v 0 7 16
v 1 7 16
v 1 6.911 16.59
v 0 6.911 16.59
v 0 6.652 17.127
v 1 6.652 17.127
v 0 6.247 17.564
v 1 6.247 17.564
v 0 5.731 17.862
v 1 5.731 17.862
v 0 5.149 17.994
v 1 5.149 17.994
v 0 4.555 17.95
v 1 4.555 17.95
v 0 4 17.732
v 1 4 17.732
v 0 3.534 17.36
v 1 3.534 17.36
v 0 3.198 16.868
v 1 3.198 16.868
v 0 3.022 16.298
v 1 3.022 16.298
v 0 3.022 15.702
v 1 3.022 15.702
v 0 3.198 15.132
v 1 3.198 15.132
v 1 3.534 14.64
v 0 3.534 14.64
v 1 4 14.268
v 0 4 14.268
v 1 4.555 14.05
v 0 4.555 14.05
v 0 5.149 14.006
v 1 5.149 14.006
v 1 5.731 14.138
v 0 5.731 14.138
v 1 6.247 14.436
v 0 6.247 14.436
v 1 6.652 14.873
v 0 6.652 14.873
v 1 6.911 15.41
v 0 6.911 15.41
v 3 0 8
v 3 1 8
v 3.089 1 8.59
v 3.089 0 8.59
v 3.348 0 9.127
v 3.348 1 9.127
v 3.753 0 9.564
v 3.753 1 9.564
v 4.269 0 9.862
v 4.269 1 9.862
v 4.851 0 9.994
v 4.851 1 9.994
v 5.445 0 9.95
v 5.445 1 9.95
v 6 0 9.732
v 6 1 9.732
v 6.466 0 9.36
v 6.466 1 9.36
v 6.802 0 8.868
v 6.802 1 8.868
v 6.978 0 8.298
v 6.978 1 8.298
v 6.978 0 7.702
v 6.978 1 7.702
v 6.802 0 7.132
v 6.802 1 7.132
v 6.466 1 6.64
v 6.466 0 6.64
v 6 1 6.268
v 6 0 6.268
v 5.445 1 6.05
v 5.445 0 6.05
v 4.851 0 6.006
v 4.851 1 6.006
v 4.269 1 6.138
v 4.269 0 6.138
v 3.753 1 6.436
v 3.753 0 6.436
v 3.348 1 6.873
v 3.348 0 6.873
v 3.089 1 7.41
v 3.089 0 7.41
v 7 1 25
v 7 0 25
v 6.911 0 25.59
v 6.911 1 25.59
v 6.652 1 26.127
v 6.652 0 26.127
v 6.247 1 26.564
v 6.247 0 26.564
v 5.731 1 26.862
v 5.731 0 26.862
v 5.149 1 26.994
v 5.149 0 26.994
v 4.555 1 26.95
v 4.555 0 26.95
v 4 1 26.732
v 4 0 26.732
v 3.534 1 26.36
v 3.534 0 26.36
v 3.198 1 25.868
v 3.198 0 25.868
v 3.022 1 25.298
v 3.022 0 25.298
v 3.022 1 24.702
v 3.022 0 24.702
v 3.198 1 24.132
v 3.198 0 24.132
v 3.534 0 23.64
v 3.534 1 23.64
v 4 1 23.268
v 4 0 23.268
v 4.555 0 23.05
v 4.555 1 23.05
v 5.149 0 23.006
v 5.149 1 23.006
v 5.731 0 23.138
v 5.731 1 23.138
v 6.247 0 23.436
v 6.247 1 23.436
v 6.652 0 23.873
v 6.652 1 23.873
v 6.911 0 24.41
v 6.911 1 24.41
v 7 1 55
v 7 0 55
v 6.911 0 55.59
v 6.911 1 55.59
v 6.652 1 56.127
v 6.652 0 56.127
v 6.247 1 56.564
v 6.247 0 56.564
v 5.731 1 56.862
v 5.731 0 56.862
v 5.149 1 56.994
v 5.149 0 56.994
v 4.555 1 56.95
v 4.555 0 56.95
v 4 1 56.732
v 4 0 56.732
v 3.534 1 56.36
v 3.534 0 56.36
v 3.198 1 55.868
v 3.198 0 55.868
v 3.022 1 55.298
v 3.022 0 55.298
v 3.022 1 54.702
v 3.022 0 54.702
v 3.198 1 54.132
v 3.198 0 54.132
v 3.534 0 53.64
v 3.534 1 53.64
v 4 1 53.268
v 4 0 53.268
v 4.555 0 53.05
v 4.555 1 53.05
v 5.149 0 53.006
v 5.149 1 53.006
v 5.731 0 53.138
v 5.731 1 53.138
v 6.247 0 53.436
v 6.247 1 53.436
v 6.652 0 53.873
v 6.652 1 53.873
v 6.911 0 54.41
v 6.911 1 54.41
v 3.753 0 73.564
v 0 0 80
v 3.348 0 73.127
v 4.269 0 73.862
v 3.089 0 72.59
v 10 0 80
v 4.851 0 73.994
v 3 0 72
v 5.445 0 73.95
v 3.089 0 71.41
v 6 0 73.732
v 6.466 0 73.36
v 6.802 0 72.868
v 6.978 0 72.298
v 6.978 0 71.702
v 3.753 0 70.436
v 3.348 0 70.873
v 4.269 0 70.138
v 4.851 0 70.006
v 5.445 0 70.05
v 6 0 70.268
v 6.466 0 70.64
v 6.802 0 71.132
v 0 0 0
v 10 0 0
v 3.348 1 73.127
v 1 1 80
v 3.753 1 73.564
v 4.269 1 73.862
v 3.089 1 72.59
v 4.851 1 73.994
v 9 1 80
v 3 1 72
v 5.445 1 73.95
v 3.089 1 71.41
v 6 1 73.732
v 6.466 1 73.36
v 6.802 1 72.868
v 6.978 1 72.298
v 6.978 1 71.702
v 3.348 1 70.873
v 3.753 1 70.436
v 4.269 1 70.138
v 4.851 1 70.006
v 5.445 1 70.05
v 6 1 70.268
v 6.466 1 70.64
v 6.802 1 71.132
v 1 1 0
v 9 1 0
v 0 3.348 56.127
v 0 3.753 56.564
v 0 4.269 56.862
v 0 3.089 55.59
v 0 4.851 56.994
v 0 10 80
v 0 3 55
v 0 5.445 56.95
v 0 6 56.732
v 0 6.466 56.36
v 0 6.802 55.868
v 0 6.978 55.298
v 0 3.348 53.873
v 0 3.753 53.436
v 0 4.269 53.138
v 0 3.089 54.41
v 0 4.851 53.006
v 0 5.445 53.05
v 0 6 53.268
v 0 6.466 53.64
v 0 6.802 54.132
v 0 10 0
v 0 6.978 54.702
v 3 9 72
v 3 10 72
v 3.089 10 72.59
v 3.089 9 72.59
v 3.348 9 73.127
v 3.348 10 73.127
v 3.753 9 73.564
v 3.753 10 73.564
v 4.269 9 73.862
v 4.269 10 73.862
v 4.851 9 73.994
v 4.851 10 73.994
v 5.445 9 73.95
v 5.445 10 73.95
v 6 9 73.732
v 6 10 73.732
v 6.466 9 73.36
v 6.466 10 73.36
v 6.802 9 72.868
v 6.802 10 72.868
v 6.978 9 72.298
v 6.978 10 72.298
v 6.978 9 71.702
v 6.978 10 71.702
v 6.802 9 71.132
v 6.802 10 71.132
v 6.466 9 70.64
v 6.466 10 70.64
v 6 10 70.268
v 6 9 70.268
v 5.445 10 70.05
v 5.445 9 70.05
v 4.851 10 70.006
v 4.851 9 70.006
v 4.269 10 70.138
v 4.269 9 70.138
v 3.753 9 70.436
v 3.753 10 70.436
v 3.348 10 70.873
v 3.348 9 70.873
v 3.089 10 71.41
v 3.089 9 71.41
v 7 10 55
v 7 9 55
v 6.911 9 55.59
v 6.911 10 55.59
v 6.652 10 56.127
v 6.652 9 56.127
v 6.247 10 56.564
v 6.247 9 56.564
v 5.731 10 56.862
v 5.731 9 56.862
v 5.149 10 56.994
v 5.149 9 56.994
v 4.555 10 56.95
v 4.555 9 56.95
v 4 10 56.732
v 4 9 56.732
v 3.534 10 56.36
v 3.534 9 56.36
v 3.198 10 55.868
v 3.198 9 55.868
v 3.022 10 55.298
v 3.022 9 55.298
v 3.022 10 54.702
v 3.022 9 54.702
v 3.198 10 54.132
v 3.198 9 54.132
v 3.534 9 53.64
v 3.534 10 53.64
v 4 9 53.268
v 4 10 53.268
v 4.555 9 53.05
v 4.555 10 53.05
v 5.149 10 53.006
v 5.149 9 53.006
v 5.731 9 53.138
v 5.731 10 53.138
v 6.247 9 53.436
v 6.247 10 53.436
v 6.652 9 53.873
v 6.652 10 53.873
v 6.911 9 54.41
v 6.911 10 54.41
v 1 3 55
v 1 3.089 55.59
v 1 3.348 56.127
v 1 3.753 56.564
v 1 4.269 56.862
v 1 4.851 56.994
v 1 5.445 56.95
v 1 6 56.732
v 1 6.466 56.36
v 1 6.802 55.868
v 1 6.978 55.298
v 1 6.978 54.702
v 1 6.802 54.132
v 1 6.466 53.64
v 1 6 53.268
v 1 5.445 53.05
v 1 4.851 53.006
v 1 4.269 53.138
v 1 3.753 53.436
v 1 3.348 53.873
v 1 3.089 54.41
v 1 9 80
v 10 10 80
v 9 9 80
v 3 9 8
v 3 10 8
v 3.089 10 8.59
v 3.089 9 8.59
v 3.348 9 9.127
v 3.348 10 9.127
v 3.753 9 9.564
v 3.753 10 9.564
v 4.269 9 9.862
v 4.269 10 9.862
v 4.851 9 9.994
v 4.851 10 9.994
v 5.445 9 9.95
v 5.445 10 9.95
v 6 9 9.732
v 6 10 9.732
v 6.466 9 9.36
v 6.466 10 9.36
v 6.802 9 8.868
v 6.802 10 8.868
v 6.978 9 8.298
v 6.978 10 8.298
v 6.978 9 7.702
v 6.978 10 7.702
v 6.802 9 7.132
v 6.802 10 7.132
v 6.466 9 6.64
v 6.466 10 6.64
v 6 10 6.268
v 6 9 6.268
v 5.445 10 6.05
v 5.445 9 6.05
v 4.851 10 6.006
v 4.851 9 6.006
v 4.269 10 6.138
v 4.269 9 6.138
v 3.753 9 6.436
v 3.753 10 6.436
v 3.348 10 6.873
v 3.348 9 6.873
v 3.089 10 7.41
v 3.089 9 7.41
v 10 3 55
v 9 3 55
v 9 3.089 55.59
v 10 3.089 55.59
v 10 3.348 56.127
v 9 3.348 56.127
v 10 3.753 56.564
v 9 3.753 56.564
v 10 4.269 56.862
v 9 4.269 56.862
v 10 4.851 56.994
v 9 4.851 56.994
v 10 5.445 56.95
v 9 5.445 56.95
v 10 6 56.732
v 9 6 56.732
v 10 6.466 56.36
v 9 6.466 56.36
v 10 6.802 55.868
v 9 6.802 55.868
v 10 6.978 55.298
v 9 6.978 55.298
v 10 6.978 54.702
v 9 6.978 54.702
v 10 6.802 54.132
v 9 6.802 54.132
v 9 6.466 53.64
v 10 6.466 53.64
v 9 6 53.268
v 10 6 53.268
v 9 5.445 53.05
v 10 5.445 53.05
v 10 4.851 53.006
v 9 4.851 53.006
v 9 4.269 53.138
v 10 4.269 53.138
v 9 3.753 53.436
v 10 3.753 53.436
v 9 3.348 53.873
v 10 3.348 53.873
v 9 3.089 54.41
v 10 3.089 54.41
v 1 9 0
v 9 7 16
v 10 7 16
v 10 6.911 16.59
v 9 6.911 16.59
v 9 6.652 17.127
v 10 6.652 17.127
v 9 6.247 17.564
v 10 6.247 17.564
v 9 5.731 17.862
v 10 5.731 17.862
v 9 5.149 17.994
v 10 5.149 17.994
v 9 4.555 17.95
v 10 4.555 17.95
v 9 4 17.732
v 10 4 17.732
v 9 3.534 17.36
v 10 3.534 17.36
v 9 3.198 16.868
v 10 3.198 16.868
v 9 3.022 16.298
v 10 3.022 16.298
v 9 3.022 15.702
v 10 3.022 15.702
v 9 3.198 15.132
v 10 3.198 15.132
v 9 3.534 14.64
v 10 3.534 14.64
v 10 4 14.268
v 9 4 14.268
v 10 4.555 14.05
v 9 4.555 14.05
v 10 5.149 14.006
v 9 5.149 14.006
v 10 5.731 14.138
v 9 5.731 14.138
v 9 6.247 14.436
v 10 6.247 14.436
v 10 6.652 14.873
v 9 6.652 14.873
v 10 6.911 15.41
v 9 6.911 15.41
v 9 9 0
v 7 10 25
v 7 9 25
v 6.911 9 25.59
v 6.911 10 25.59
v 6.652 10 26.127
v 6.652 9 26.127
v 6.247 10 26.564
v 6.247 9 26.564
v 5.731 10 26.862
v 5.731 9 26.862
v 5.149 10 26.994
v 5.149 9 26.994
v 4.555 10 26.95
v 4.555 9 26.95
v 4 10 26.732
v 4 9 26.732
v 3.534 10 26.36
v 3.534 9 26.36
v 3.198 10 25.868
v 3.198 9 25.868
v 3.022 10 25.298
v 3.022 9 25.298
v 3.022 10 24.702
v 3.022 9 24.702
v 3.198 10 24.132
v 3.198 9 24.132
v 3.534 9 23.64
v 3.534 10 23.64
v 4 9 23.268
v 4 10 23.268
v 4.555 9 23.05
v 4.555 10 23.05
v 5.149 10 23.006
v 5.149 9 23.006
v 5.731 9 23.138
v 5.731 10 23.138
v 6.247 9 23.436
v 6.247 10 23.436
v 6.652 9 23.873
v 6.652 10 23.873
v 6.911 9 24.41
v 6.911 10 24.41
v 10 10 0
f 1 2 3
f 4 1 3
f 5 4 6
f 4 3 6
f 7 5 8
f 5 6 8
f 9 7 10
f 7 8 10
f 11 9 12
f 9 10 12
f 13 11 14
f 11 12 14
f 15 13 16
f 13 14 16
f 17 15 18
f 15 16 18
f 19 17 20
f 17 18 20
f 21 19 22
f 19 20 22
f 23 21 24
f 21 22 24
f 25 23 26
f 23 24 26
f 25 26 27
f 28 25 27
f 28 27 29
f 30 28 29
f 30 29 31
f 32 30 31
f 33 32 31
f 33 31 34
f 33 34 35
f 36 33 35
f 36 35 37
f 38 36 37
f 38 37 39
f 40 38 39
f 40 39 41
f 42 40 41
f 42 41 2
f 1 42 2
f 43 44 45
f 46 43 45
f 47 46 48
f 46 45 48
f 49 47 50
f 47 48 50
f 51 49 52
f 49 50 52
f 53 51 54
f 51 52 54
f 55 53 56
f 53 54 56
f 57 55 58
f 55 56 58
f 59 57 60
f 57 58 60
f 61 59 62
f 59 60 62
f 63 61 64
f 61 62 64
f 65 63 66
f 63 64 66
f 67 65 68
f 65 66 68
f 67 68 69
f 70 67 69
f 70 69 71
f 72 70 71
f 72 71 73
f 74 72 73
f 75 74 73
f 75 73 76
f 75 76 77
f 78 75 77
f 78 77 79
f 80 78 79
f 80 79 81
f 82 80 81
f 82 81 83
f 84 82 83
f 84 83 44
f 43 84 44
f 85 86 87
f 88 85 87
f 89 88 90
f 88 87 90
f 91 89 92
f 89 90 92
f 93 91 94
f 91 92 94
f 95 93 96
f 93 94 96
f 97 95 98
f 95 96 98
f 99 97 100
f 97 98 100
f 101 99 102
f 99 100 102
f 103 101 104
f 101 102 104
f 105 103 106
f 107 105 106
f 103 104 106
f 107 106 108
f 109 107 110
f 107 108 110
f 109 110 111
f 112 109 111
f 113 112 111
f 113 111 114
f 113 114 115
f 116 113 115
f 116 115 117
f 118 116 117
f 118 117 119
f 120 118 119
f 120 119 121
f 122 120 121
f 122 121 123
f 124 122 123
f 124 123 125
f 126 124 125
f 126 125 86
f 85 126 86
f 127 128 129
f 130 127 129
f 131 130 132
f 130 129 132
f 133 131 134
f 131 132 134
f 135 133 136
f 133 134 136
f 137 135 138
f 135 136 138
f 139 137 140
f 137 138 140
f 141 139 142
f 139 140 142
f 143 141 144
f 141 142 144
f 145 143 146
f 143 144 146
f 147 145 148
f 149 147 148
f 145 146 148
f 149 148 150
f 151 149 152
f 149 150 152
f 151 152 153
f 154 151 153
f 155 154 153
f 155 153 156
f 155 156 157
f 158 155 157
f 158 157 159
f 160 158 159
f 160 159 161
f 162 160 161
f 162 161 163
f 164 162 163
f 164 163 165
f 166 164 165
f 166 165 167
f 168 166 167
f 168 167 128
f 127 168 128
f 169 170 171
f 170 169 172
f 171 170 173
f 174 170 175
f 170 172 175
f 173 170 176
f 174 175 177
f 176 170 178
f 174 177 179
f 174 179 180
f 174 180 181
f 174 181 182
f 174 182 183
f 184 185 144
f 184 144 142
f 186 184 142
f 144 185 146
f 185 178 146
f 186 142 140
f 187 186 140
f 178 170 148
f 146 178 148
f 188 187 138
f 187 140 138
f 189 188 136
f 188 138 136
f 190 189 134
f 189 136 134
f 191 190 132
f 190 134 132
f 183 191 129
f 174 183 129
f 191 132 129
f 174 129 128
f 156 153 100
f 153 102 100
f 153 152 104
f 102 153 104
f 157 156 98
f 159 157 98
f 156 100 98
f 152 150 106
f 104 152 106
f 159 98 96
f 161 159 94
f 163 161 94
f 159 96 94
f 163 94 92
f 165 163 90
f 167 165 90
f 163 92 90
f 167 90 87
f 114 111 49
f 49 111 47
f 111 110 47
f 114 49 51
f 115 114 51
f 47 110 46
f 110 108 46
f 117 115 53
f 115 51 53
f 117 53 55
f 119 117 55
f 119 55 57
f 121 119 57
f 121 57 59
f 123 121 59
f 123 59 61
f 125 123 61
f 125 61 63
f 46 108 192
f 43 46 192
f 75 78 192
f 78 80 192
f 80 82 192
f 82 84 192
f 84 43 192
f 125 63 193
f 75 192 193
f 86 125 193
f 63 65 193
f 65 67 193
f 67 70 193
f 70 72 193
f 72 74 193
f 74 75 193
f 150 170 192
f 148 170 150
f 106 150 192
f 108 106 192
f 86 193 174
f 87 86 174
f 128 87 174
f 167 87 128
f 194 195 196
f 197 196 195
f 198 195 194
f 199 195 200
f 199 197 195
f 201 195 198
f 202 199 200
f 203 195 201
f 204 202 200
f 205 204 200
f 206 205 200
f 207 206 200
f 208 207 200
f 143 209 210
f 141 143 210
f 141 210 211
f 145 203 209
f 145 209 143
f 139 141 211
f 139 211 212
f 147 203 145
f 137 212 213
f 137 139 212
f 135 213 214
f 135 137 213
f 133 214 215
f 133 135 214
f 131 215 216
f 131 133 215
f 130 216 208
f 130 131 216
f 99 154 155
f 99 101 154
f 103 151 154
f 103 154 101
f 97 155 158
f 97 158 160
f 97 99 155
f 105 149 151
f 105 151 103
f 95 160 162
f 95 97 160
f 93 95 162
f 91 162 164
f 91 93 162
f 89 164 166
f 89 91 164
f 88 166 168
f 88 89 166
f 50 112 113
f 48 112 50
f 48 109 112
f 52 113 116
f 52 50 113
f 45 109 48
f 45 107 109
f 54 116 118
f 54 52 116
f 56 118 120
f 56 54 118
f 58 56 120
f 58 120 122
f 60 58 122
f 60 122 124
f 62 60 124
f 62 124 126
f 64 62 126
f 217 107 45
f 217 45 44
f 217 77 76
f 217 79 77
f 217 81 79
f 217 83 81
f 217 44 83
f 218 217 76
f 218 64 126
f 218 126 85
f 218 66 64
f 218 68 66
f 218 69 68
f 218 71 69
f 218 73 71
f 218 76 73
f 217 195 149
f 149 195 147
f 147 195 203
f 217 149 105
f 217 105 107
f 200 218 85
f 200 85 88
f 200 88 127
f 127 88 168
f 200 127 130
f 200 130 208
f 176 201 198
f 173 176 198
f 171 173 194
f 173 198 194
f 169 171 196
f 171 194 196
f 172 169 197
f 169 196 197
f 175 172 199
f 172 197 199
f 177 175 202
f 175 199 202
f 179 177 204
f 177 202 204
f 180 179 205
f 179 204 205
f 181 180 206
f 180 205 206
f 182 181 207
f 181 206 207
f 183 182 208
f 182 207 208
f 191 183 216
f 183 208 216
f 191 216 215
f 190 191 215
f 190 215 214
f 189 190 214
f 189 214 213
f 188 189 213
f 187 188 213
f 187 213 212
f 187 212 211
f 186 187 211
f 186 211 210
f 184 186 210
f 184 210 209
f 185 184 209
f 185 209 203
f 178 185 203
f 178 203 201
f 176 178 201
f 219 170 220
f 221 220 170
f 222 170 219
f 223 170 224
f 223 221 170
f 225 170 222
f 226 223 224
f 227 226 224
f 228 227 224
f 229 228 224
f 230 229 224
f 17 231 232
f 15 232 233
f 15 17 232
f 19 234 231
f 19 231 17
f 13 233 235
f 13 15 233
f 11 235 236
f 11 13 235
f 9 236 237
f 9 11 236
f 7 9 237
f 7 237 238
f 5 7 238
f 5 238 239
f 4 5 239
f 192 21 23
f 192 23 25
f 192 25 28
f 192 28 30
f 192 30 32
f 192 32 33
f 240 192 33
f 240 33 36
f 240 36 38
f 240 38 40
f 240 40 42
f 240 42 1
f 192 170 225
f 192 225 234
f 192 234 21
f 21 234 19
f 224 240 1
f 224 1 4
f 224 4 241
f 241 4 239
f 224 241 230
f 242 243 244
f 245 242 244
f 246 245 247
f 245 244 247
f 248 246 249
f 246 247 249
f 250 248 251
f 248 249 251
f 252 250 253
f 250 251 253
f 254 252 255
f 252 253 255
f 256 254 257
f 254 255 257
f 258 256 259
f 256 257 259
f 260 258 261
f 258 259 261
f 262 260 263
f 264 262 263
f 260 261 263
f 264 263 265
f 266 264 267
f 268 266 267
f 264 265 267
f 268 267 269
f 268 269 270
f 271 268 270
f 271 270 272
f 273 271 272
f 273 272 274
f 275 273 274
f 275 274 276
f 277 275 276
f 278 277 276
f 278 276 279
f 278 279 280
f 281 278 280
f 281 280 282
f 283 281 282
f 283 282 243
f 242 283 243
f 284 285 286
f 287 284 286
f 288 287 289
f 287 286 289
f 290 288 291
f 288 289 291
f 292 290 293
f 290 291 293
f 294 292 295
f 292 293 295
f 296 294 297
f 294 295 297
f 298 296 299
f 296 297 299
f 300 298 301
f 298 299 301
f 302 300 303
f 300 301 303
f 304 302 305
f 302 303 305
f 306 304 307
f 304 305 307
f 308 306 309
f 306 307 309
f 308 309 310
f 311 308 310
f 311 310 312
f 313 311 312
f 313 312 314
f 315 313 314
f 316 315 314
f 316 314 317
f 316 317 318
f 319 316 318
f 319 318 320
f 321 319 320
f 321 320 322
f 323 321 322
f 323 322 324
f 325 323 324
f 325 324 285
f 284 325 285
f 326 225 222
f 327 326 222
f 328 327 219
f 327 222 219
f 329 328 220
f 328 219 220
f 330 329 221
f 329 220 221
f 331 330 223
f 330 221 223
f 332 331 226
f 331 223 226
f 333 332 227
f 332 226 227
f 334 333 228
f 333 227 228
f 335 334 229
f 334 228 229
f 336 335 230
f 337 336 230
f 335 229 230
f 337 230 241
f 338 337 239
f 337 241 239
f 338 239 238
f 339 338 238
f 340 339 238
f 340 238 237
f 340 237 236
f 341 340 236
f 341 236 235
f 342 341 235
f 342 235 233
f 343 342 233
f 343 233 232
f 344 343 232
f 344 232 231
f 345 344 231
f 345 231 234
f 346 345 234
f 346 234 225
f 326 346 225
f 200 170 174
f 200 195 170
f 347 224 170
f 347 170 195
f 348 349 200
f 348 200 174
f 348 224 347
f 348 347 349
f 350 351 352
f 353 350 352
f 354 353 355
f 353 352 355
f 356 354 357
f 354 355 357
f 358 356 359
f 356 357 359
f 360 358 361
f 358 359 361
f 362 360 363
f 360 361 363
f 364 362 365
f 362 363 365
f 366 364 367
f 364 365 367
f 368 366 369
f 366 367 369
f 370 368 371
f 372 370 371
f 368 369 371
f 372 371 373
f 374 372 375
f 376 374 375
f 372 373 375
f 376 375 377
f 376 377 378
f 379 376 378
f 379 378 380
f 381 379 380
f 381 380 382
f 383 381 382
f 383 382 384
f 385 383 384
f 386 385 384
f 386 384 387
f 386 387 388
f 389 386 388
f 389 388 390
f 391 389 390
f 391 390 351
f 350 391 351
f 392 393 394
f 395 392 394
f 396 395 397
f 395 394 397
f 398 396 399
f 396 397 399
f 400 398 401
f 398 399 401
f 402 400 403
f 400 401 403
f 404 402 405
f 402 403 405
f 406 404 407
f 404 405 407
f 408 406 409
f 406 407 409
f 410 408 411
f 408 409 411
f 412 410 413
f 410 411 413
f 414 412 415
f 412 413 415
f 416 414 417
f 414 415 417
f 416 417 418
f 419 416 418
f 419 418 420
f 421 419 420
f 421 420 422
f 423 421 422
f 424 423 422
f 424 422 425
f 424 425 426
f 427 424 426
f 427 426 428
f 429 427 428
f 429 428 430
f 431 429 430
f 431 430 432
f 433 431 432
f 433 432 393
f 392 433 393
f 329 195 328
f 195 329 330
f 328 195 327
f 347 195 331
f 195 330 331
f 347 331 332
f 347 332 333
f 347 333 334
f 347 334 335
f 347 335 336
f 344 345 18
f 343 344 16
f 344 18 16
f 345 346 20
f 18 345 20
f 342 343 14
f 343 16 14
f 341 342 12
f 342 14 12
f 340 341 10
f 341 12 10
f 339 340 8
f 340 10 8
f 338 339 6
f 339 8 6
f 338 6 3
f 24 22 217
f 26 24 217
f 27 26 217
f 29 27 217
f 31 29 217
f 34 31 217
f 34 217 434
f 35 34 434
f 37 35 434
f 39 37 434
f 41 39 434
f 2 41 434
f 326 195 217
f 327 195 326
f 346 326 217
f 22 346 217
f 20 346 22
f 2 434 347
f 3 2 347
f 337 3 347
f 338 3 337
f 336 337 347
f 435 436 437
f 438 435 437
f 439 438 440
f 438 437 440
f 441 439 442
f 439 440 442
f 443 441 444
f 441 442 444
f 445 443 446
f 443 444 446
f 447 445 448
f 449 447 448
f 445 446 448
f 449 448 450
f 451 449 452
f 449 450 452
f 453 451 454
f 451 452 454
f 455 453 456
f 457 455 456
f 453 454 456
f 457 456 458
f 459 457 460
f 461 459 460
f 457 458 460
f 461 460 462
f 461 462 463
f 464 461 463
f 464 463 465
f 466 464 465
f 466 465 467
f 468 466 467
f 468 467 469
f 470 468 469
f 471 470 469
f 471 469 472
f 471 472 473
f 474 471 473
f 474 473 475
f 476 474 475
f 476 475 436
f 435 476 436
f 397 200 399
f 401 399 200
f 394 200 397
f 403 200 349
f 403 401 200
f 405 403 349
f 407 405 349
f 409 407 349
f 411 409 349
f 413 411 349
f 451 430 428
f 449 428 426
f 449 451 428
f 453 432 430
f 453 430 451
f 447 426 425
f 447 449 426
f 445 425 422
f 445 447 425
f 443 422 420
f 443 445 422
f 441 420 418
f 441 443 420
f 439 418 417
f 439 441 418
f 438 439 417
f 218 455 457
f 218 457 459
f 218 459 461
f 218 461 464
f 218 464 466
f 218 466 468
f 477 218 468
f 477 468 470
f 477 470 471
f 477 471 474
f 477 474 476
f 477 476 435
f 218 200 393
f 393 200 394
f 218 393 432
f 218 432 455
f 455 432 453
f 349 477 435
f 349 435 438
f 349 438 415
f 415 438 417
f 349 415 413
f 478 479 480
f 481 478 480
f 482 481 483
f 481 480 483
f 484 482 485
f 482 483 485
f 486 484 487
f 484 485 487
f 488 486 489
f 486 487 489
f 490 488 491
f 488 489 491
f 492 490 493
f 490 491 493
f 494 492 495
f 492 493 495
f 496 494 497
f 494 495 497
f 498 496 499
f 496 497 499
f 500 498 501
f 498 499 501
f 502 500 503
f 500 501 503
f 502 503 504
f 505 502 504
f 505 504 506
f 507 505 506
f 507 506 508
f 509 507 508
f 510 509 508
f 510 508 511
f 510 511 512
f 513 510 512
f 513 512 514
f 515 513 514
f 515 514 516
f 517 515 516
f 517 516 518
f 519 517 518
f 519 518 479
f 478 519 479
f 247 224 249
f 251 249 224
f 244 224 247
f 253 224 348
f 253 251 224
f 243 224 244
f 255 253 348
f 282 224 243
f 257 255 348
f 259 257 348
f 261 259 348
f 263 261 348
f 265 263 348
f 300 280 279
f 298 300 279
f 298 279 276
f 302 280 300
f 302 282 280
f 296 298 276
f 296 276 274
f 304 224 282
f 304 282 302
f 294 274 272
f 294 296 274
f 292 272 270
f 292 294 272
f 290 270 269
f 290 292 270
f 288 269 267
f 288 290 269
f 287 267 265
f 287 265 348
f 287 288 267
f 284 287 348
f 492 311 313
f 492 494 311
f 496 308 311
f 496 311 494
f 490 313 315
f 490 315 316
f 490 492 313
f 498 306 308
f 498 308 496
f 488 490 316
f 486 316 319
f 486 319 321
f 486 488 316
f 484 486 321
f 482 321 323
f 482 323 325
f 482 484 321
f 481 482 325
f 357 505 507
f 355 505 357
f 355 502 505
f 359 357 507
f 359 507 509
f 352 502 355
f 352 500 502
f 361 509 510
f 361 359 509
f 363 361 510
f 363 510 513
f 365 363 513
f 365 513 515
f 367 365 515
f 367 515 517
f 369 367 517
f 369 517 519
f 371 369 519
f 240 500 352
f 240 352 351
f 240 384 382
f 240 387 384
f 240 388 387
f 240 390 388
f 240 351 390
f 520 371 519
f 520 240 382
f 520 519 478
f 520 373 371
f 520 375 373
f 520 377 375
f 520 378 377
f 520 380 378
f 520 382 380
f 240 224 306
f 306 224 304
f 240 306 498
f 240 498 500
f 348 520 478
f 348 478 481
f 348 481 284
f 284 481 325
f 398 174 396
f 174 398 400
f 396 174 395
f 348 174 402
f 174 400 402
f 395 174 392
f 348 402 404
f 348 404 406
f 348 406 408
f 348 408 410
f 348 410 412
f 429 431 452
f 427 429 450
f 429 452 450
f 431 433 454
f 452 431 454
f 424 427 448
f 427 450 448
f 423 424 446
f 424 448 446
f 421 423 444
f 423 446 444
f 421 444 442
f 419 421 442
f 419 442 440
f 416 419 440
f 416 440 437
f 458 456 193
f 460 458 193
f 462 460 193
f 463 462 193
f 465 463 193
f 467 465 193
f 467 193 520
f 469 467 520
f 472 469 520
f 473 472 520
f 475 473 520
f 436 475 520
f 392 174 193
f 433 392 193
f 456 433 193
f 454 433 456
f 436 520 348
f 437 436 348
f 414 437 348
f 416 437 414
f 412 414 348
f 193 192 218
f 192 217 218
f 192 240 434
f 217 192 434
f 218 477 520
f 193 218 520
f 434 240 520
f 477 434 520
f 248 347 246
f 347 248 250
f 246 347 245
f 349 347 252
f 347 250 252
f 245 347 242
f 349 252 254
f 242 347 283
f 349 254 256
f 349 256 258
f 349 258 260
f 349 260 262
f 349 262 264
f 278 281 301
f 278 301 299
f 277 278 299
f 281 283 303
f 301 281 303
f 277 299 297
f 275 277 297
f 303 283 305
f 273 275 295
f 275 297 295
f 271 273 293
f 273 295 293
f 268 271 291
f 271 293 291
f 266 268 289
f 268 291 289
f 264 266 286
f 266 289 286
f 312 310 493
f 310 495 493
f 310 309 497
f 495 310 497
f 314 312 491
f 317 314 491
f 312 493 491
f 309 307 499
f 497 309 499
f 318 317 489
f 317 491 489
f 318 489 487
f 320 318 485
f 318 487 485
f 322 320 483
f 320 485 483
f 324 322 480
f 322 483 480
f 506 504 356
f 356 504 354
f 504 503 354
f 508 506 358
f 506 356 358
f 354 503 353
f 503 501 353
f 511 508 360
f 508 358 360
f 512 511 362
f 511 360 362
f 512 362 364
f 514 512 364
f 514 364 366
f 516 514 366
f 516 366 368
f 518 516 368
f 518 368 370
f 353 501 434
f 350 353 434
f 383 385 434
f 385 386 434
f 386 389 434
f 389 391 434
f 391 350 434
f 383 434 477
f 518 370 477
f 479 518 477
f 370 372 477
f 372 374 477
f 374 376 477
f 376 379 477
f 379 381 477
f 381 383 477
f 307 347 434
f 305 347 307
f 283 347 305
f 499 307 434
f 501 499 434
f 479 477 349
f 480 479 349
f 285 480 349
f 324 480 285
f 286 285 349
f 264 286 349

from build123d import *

# Parameters (mm, degrees)
SKETCH_1_W          = 10
SKETCH_1_H          = 10
SKETCH_1_W_2        = 8
SKETCH_1_H_2        = 8
EXTRUDE_2_DEPTH     = 80
SKETCH_2_R          = 2
CUT_EXTRUDE_1_DEPTH = 70
SKETCH_3_R          = 2
CUT_EXTRUDE_2_DEPTH = 104
SKETCH_4_R          = 2
CUT_EXTRUDE_3_DEPTH = 104
SKETCH_5_R          = 2
CUT_EXTRUDE_4_DEPTH = 100
SKETCH_6_R          = 2
CUT_EXTRUDE_5_DEPTH = 10


with BuildPart() as part:
    # 草图1 → 凸台-拉伸2 (new body)
    with BuildSketch(Plane.XY):
        with Locations((5, 5)):
            Rectangle(SKETCH_1_W, SKETCH_1_H)
        with Locations((5, 5)):
            Rectangle(SKETCH_1_W_2, SKETCH_1_H_2, mode=Mode.SUBTRACT)
    extrude(amount=EXTRUDE_2_DEPTH)

    # 草图2 → 切除-拉伸1 (cut)
    with BuildSketch(Plane(origin=(0, 10, 0), x_dir=(1, 0, 0), z_dir=(0, 1, 0))):
        with Locations(Location((5, -72, 0), (0, 0, 180))):
            Circle(SKETCH_2_R)
        with Locations(Location((5, -8, 0), (0, 0, 180))):
            Circle(SKETCH_2_R)
    extrude(amount=-CUT_EXTRUDE_1_DEPTH, mode=Mode.SUBTRACT)

    # 草图3 → 切除-拉伸2 (cut)
    with BuildSketch(Plane.XZ):
        with Locations((5, 25)):
            Circle(SKETCH_3_R)
    extrude(amount=-CUT_EXTRUDE_2_DEPTH, mode=Mode.SUBTRACT)

    # 草图4 → 切除-拉伸3 (cut)
    with BuildSketch(Plane.XZ):
        with Locations((5, 55)):
            Circle(SKETCH_4_R)
    extrude(amount=-CUT_EXTRUDE_3_DEPTH, mode=Mode.SUBTRACT)

    # 草图5 → 切除-拉伸4 (cut)
    with BuildSketch(Plane(origin=(10, 0, 0), x_dir=(0, 0, -1), z_dir=(1, 0, 0))):
        with Locations(Location((-16, 5, 0), (0, 0, 90))):
            Circle(SKETCH_5_R)
    extrude(amount=-CUT_EXTRUDE_4_DEPTH, mode=Mode.SUBTRACT)

    # 草图6 → 切除-拉伸5 (cut)
    with BuildSketch(Plane.ZY):
        with Locations(Location((55, 5, 0), (0, 0, 270))):
            Circle(SKETCH_6_R)
    extrude(amount=-CUT_EXTRUDE_5_DEPTH, mode=Mode.SUBTRACT)


solid = part.part
